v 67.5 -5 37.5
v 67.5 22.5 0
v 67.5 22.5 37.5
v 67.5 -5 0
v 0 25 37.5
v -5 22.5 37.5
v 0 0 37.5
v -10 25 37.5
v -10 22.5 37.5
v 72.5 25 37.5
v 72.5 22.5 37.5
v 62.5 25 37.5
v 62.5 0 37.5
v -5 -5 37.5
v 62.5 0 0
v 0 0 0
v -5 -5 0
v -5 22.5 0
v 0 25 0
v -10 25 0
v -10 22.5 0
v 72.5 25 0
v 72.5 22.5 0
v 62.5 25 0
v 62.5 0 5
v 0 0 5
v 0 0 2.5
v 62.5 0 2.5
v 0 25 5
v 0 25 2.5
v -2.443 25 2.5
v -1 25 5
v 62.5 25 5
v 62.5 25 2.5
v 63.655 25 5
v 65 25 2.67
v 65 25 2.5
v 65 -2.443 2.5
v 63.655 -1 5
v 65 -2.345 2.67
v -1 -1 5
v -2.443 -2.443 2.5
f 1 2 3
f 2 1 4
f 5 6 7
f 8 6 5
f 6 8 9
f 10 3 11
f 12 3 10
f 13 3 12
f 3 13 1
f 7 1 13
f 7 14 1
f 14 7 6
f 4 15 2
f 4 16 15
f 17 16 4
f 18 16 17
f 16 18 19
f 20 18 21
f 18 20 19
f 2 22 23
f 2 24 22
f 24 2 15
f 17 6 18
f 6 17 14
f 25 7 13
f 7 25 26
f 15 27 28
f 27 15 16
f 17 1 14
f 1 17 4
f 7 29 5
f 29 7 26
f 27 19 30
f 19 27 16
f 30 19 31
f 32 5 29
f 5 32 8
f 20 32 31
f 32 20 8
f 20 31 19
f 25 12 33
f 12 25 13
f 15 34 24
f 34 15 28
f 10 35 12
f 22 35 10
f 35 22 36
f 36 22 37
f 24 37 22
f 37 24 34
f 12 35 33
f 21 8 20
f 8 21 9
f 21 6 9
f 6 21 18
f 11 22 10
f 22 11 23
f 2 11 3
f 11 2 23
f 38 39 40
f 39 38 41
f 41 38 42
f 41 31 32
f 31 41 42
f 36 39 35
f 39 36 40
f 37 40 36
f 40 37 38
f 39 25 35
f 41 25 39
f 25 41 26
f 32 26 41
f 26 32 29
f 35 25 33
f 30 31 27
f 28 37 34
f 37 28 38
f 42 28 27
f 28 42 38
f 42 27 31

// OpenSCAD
module d4() {
    import("/Users/audrey/Downloads/Braille_Polyhedral_Dice_-_March_2018_version_2836494/files/d4.STL", center = true);
}

module d6() {
    import("/Users/audrey/Downloads/Braille_Polyhedral_Dice_-_March_2018_version_2836494/files/d6C.STL", center = true);
}

module d8() {
    d8width = 32.77;
    d8height = 23.53;

    translate([-d8height * 0.5, d8width * -0.5, d8height * -0.5]) import("/Users/audrey/Downloads/Braille_Polyhedral_Dice_-_March_2018_version_2836494/files/d8.STL", center = true);
}

module d10() {
    d10x = 27.99;
    d10y = 29.15;
    d10z = 28.1;
    translate([d10x * -0.5, d10y * -0.5, d10z * -0.5]) import("/Users/audrey/Downloads/Braille_Polyhedral_Dice_-_March_2018_version_2836494/files/d10.STL", center = true);
}

module d12() {
    import("/Users/audrey/Downloads/Braille_Polyhedral_Dice_-_March_2018_version_2836494/files/d12.STL", center = true);
}

module d20() {
    import("/Users/audrey/Downloads/Braille_Polyhedral_Dice_-_March_2018_version_2836494/files/d20_corrected.STL", center = true);
}

module centeredCube(x=10, y=10, z=10) {
    translate([x * -0.5, y * -0.5, z * -0.5]) cube([x, y, z]);
}


//rotate([9, 4.5, 0]) translate([-40, -40, 10]) d20();

module braille_dice() {
    rotate([10.5, 0.3, 0]) translate([4, 4, 5]) d20();

    translate([63, 0, 25]) rotate([-90, 0, 45]) d4();

    d6_width = 22.99;

    translate([9, 44, 12]) d6();

    translate([56, 57, 21]) rotate([35, 0, 0]) d8();

    d12w = 40;
    d12l = 40;
    d12h = 40;

    translate([77, 32, 11]) rotate([90, 0, 0]) d12();

    translate([90, 57, 21]) rotate([42.5, 0, 0]) rotate([0, 20, 0]) d10();
}

//d10x = 27.99;
//d10y = 29.15;
//d10z = 28.1;
//translate([d10x * -0.5, d10y * -0.5, d10z * -0.5]) d10();
//centeredCube(x=d10x, y=d10y, z=d10z) cube([d10x, d10y, d10z]);


//braille_dice();

//d8width = 32.77;
//d8height = 23.53;
//
//translate([-d8height * 0.5, d8width * -0.5, d8height * -0.5]) d8();
//translate([-d8height * 0.5, d8width * -0.5, d8height * -0.5]) cube([d8height, d8width, d8height]);

//translate([d6_width * -0.5, d6_width * -0.5, d6_width * -0.5]) d6();
//cube(d6_width * 0.5);
//rotate([90, 180, 0]) cube(d6_width * 0.5);

function inch_to_mm(inches) = inches / 2 * 2.5 * 10;

//l = 6 / 2 * 2.5 * 10;
//w = 4 / 2 * 2.5 * 10;
//h = 2.5 / 2 * 2.5 * 10;

l = inch_to_mm(5);
w = inch_to_mm(4);
h = inch_to_mm(3);

echo(l);
echo(w);

thickness = 5; // 8mm = .8cm



echo(h);

module disc() {
    minkowski() {
        cylinder(h = thickness, r = w / 6);
        sphere(3);
    }
}
echo(w / 3);

module base_top_basic() {
    translate([thickness * -0.5, thickness * -0.5, 0.5 * thickness]) cube([l + thickness, w + thickness, 0.5 * thickness]);
}

module base_top() {
    difference() {
    base_top_basic();
    union() {
        translate([0, -1, 0]) rotate([60, 0, 0]) scale([1.1, 1, 1]) base_top_basic();
        translate([-1, 0, 0]) rotate([0, -60, 0]) scale([1, 1.1, 1]) base_top_basic();
        translate([l, 0, 2]) rotate([0, 60, 0]) scale([1, 1.1, 1]) base_top_basic();
        translate([0, w, 2]) rotate([-60, 0, 0]) scale([1.1, 1, 1]) base_top_basic();
    }
    }
}

module base_no_keys() {
    cube([l, w, thickness]);
    base_top();
}

module base() {
    union() {
        cube([l, w, thickness]);
        base_top();
        proportions = [0.175, 0.5, 0.825];
        w_proportion = 0.25;
//        for (i=proportions){
//            portion = i; // * 0.25;
//            translate([l * portion, w * w_proportion, 3]) disc();
//            translate([l * portion, w * (1 - w_proportion), 3]) disc();
//        }
        for (i=[0, 1]) {
            x_coord = proportions[i] + 0.5 * (proportions[i + 1] - proportions[i]);
            translate([l * x_coord, w - thickness, thickness]) cube(thickness);
            translate([l * x_coord, 0, thickness]) cube(thickness);
        }
    }
}

//base();

module side() {
    difference() {
        union() {
            translate([-thickness, -thickness, 0]) cube([l + 2 * thickness, thickness, h]);
            translate([-thickness, -thickness, 0]) cube([thickness, w * 0.5 + thickness, h]);
            translate([l, -thickness, 0]) cube([thickness, w * 0.5 + thickness, h]);
            translate([-2 * thickness, w * 0.5 - thickness * 0.5, 0]) cube([thickness * 2, thickness * 0.5, h]);
            translate([l, w * 0.5 - thickness * 0.5, 0]) cube([thickness * 2, thickness * 0.5, h]);
        }
        base_top();
    }
}
module hemisphere(r=2.5, fidelity=100) {
    difference() {
       sphere(r=r, $fn=fidelity);
       translate([-r, -r, -2 * r]) cube([r * 2, r * 2, r * 2]);
    }
}

module base_with_cabochons() {
hemisphere_size = 4;
translate([0, 0, -0.5 * thickness]) {
    
    proportions = [0.175, 0.5, 0.825];
    w_proportion = 0.25;
//        for (i=proportions){
//            portion = i; // * 0.25;
//            translate([l * portion, w * w_proportion, 3]) disc();
//            translate([l * portion, w * (1 - w_proportion), 3]) disc();
//        }
    for (i=[0, 1]) {
        x_coord = proportions[i] + 0.5 * (proportions[i + 1] - proportions[i]);
        translate([l * x_coord, w - hemisphere_size, thickness]) hemisphere(r=hemisphere_size);
        translate([l * x_coord + (i * 2 - 1) * 2 * hemisphere_size, hemisphere_size, thickness]) hemisphere(r=hemisphere_size);
    }
//    hemisphere();
}
translate([0, 0, thickness * 0.5]) {
    translate([l * 0.5, w * 0.5, 0]) hemisphere(5);
    translate([5, w - 5 - 5, 0]) hemisphere(5);
    translate([l - 5, 5, 0]) hemisphere(5);
    translate([6, 6 + 6, 0]) hemisphere(6);
    translate([l - 6, w - 6, 0]) hemisphere(6);
}
cube([l, w, thickness * 0.5]);
}

//base_no_keys();
side();
//translate([l, w, 0]) rotate([0, 0, 180]) side();

//translate([l * 0.25, w * 0.33, 0]) disc();
